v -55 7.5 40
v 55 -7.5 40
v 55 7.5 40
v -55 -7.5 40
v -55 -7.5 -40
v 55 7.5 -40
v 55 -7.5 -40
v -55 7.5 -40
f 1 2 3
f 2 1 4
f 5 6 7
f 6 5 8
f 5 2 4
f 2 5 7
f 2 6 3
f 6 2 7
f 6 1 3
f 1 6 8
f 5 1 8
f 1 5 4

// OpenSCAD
// ========================================
// a 110 x 15 x 80 mm box
// NeuroCAD canonical IR; dimensions are millimetres
// ========================================
$fn = 48;

cube(size=[110, 15, 80], center=true);
